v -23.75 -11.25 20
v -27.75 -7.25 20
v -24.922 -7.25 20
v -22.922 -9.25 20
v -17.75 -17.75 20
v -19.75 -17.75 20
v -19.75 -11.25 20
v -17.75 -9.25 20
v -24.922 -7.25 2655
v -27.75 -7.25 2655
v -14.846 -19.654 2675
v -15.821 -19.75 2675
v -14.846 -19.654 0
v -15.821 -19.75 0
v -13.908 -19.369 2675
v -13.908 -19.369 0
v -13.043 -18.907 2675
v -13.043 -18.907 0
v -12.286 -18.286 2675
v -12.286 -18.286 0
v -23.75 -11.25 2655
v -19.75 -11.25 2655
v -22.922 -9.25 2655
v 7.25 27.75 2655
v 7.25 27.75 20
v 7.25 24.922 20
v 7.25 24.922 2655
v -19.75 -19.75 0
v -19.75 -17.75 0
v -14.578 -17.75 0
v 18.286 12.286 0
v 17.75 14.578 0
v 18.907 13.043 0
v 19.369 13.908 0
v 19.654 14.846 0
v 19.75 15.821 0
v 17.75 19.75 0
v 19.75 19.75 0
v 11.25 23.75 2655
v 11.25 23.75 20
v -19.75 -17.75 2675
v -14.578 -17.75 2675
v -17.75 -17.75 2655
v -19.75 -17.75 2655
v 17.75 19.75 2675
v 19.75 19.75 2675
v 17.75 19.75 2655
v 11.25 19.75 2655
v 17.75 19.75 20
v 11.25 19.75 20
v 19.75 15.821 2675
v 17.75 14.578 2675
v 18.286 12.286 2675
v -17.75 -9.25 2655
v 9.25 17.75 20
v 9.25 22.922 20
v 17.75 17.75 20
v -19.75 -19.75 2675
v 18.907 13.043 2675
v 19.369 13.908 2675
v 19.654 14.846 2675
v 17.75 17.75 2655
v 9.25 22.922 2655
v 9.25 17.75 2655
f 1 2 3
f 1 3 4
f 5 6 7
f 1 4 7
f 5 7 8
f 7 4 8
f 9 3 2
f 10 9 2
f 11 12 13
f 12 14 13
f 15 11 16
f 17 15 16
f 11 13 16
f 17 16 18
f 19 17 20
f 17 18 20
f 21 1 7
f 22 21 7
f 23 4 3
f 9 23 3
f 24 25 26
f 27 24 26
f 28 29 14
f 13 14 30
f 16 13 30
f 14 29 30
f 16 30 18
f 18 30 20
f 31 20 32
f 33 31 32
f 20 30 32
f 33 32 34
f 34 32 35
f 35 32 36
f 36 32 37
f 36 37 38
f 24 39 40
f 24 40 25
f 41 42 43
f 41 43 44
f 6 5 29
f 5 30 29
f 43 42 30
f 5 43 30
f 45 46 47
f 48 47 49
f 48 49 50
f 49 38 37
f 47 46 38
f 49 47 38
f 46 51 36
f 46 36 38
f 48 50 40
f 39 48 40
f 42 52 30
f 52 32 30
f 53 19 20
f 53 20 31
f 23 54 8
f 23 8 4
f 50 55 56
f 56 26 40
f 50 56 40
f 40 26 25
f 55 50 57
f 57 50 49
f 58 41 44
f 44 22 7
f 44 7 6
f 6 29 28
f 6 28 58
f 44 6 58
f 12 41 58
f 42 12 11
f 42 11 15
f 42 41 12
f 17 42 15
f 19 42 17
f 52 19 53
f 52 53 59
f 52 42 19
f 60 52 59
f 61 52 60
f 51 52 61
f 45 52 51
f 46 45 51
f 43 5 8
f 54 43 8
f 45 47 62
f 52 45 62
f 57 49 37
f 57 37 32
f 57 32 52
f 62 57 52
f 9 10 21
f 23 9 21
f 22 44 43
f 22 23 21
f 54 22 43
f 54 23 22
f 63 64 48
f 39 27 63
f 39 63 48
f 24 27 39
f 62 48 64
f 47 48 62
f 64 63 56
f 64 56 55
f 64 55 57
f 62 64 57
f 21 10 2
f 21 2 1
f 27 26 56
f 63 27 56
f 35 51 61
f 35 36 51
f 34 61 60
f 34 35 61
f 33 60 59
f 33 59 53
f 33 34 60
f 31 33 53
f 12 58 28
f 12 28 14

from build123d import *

# Parameters (mm, degrees)
F1_DEPTH = 20
F3_DEPTH = 2635
F5_DEPTH = 20
F6_R     = 5


with BuildPart() as f1:
    # F0 (on Top) → F1 (new body)
    with BuildSketch(Plane.XY):
        Polygon((-19.75, -17.750001), (-19.75, -19.75), (-13.75, -19.75), (19.75, 13.75), (19.75, 19.75), (17.750001, 19.75), (17.750001, 14.578427), (-14.578427, -17.750001), align=None)
    extrude(amount=F1_DEPTH)

    # F2 (on face) → F3 (join)
    with BuildSketch(Plane.XY.offset(20)):
        Polygon((-19.75, -19.75), (-13.75, -19.75), (19.75, 13.75), (19.75, 19.75), (11.25, 19.75), (11.25, 23.75), (7.25, 27.75), (7.25, 24.921573), (9.25, 22.921573), (9.25, 19.75), (9.25, 17.750001), (17.750001, 17.750001), (17.750001, 14.578427), (14.335787, 11.164213), (-11.164213, -14.335787), (-14.578427, -17.750001), (-17.750001, -17.750001), (-17.750001, -9.25), (-19.75, -9.25), (-22.921573, -9.25), (-24.921573, -7.25), (-27.75, -7.25), (-23.75, -11.25), (-19.75, -11.25), align=None)
    extrude(amount=F3_DEPTH)

    # F4 (on face) → F5 (join)
    with BuildSketch(Plane.XY.offset(2655)):
        Polygon((19.75, 13.75), (19.75, 19.75), (17.750001, 19.75), (17.750001, 14.578427), (-14.578427, -17.750001), (-19.75, -17.750001), (-19.75, -19.75), (-13.75, -19.75), align=None)
    extrude(amount=F5_DEPTH)

    # F6
    f6_edges = [f1.edges().sort_by_distance(p)[0] for p in [
        (19.75, 13.75, 1337.5),
        (-13.75, -19.75, 1337.5),
    ]]
    fillet(f6_edges, radius=F6_R)


solid = f1.part
